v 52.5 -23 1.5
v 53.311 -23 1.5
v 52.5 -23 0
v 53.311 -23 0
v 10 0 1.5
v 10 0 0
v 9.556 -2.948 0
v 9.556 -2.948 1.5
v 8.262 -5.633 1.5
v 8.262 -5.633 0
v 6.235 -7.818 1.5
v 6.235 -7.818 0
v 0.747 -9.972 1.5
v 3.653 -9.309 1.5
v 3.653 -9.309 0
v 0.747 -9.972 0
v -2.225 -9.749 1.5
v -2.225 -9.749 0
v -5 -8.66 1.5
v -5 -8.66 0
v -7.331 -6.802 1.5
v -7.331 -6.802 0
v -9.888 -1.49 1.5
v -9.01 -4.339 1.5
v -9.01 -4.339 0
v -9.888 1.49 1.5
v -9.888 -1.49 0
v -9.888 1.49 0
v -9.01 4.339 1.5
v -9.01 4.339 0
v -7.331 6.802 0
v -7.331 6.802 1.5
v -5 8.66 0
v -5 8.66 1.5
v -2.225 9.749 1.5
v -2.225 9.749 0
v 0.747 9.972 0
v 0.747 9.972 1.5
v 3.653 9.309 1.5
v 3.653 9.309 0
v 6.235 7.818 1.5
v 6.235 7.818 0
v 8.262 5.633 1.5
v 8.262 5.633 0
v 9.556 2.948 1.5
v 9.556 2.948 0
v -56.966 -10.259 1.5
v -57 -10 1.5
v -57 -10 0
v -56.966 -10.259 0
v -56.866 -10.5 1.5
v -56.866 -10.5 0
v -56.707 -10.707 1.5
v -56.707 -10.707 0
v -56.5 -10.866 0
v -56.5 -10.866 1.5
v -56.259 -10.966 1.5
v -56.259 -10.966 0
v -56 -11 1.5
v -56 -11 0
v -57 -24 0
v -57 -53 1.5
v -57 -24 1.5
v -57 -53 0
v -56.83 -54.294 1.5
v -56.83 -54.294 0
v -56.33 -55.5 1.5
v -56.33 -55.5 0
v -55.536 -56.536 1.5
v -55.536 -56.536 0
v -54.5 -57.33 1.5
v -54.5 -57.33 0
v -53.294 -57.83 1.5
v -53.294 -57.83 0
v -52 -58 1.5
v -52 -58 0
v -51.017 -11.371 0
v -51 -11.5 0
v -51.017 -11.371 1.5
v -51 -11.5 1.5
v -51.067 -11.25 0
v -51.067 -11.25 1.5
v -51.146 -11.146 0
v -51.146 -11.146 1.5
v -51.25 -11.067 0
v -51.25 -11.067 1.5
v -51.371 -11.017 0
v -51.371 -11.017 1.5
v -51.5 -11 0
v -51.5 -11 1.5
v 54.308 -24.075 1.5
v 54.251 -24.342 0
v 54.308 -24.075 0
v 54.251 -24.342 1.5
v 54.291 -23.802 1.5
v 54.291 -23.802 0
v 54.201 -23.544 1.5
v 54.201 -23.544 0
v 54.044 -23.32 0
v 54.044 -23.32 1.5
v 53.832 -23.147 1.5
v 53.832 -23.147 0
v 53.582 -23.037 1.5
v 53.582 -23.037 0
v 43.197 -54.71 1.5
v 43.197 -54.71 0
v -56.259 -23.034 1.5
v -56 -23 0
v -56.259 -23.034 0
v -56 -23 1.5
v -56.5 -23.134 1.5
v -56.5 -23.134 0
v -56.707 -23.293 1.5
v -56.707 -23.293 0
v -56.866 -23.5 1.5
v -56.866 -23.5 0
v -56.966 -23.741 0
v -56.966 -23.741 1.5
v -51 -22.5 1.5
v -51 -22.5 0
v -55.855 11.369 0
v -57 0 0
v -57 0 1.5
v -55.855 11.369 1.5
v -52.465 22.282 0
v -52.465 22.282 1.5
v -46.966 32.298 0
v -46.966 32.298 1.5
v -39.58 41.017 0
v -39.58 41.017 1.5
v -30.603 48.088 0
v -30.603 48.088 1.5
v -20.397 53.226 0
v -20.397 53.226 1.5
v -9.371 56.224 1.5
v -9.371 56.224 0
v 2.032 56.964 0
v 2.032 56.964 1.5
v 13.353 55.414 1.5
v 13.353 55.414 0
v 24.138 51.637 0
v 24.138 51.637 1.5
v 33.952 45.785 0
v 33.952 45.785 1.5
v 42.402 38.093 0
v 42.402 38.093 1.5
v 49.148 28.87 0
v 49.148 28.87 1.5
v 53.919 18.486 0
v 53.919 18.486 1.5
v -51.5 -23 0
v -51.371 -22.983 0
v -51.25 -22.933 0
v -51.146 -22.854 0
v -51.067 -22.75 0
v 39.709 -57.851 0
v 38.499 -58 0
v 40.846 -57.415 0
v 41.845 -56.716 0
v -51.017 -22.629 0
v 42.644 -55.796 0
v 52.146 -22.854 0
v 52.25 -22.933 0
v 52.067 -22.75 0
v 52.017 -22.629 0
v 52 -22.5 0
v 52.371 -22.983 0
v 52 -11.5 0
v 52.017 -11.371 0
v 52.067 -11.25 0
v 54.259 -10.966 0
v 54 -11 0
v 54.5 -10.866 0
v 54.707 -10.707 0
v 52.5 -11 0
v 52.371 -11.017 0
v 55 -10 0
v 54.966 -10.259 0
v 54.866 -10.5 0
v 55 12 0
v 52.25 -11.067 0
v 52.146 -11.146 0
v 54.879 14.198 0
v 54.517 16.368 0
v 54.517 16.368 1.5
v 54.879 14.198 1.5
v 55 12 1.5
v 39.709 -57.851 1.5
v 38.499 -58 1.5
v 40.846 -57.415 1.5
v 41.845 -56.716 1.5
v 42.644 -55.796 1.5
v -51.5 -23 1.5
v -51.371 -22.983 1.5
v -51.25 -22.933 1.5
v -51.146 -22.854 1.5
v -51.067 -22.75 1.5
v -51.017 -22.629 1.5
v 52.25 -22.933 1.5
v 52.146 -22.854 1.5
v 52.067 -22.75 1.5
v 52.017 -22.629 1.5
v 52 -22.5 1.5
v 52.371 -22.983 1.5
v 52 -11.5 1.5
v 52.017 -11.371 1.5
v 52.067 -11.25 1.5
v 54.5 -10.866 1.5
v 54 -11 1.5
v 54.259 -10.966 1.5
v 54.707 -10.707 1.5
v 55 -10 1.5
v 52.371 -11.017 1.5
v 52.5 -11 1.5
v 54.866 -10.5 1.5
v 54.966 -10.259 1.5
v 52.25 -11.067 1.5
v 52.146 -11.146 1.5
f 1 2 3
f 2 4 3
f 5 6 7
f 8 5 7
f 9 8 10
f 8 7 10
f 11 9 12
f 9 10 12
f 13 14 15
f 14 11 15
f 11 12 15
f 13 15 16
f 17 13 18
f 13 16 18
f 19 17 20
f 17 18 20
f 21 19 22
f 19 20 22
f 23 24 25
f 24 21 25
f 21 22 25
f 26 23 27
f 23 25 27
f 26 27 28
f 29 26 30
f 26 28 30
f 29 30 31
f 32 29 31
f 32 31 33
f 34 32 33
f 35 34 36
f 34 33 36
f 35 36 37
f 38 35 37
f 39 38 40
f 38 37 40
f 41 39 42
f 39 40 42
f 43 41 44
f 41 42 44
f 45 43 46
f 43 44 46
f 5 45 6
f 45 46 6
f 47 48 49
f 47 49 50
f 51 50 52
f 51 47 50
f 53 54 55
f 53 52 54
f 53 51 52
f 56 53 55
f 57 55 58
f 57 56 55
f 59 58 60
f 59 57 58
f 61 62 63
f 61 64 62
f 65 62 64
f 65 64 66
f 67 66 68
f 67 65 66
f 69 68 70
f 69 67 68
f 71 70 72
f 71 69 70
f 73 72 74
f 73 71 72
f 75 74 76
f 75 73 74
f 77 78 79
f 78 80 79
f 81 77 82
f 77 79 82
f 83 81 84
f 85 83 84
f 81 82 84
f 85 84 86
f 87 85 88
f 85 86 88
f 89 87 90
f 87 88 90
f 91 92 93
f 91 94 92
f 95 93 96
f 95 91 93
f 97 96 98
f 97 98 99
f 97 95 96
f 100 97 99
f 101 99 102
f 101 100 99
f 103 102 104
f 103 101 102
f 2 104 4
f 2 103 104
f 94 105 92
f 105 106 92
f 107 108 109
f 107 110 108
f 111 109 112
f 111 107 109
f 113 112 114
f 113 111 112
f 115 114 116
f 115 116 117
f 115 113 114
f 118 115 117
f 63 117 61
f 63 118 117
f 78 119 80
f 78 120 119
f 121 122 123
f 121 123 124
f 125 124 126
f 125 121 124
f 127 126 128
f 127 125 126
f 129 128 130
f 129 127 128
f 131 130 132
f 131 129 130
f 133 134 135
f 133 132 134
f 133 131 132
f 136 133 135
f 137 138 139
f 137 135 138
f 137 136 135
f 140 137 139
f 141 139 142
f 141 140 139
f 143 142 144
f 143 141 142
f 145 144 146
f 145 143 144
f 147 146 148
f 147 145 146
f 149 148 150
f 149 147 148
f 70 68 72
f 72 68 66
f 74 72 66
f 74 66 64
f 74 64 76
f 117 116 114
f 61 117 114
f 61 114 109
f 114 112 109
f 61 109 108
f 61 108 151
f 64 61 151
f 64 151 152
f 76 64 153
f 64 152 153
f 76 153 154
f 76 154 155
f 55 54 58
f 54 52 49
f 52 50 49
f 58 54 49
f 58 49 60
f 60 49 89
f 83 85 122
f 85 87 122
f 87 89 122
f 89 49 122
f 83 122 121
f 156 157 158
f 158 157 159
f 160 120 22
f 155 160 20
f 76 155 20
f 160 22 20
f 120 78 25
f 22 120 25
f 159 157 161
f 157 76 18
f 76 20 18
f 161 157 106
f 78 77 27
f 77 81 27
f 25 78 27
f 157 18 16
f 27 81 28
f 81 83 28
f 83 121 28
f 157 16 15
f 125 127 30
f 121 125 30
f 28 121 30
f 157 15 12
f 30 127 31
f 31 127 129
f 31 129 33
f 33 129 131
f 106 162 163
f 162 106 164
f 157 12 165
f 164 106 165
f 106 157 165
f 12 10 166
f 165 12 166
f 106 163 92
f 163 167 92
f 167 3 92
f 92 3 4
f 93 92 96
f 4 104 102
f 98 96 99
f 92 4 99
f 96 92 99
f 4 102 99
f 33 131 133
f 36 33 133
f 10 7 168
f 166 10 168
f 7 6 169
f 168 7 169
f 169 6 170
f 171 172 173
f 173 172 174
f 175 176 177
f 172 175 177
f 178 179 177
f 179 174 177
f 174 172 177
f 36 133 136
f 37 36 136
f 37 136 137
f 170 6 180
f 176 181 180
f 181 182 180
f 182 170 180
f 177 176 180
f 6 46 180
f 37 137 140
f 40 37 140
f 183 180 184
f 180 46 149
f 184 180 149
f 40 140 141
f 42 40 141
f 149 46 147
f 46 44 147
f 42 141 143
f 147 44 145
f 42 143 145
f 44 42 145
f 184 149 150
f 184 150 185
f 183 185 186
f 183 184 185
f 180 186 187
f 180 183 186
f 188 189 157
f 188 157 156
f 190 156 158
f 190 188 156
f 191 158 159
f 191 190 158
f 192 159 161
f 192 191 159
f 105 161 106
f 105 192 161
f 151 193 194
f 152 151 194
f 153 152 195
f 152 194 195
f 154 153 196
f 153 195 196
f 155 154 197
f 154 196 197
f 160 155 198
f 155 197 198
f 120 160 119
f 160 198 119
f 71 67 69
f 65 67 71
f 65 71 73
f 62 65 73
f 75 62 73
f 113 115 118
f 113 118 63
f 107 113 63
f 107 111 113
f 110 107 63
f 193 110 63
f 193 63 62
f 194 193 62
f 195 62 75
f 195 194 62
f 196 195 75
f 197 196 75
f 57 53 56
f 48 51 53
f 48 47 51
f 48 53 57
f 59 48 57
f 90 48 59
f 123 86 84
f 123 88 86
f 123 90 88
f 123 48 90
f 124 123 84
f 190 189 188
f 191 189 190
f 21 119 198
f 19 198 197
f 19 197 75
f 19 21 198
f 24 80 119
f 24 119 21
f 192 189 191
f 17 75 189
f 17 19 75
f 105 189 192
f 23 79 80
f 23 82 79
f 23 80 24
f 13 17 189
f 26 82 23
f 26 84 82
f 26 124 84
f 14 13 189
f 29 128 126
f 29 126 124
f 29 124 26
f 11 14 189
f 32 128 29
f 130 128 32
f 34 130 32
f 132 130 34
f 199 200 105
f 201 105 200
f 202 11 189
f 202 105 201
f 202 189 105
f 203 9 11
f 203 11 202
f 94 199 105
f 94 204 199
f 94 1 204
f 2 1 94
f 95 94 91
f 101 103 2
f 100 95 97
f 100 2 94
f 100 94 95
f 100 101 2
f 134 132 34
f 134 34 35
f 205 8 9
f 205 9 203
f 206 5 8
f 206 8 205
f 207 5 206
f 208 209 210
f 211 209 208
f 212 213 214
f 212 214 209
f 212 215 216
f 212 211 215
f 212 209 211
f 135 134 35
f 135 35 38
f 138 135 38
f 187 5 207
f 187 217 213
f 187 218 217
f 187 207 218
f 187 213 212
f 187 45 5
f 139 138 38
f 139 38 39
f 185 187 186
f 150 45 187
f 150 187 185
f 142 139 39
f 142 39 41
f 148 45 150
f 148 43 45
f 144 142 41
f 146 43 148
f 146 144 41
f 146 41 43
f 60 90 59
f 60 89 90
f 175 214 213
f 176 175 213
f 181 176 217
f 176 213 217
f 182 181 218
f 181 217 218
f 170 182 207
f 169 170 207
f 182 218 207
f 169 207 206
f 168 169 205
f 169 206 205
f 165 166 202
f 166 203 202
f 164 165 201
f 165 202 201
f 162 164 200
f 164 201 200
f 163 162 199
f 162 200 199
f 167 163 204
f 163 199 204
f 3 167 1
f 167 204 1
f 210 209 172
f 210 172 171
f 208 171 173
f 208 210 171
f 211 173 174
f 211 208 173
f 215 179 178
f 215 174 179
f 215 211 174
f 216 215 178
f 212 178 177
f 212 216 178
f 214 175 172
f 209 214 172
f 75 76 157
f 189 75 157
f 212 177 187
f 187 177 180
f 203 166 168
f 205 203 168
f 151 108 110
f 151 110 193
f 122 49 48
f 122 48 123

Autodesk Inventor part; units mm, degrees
ref_plane "YZ Plane" through (0, 0, 0) normal (1, 0, 0) x (0, 1, 0)
ref_plane "XZ Plane" through (0, 0, 0) normal (0, 1, 0) x (-1, 0, 0)
ref_plane "XY Plane" through (0, 0, 0) normal (0, 0, 1) x (1, 0, 0)
sketch "Sketch1" plane through (0, 0, 0) normal (0, 0, 1) x (1, 0, 0)
  circle A0 centre (0, 0) radius 10
  line L0 (-57, -58) -> (42, -58)
  line L1 (42, -58) -> (54.739, -23)
  line L2 (54.739, -23) -> (52, -23)
  line L3 (52, -23) -> (52, -11)
  line L4 (52, -11) -> (55, -11)
  line L5 (55, -11) -> (55, 12)
  line L6 (-57, -58) -> (-57, -23)
  line L7 (-57, -23) -> (-51, -23)
  line L8 (-51, -23) -> (-51, -11)
  line L9 (-51, -11) -> (-57, -11)
  line L10 (-57, -11) -> (-57, 0)
  arc A1 (53.9189, 18.4865) -> (-57, 0) centre (0, 0) ccw
  arc A2 (55, 12) -> (53.9189, 18.4865) centre (35, 12) ccw
  dimension "d0" = 20
  dimension "d1" = 57
  dimension "d2" = 20
  dimension "d3" = 99
  dimension "d4" = 6
  dimension "d5" = 110
  dimension "d6" = 3
  dimension "d7" = 12
  dimension "d8" = 58
  dimension "d9" = 12
  dimension "d10" = 55
  dimension "d11" = 47
extrude "Extrusion1" add sketch "Sketch1" along normal blind 1.5
fillet "Fillet1" radius 0.5 4 edges at (52, -23, 0.75) (52, -11, 0.75) (-51, -11, 0.75) (-51, -23, 0.75)
fillet "Fillet2" radius 1 4 edges at (-57, -11, 0.75) (-57, -23, 0.75) (55, -11, 0.75) (54.739, -23, 0.75)
fillet "Fillet3" radius 5 2 edges at (42, -58, 0.75) (-57, -58, 0.75)
properties part number "NPT Flange Outer"
